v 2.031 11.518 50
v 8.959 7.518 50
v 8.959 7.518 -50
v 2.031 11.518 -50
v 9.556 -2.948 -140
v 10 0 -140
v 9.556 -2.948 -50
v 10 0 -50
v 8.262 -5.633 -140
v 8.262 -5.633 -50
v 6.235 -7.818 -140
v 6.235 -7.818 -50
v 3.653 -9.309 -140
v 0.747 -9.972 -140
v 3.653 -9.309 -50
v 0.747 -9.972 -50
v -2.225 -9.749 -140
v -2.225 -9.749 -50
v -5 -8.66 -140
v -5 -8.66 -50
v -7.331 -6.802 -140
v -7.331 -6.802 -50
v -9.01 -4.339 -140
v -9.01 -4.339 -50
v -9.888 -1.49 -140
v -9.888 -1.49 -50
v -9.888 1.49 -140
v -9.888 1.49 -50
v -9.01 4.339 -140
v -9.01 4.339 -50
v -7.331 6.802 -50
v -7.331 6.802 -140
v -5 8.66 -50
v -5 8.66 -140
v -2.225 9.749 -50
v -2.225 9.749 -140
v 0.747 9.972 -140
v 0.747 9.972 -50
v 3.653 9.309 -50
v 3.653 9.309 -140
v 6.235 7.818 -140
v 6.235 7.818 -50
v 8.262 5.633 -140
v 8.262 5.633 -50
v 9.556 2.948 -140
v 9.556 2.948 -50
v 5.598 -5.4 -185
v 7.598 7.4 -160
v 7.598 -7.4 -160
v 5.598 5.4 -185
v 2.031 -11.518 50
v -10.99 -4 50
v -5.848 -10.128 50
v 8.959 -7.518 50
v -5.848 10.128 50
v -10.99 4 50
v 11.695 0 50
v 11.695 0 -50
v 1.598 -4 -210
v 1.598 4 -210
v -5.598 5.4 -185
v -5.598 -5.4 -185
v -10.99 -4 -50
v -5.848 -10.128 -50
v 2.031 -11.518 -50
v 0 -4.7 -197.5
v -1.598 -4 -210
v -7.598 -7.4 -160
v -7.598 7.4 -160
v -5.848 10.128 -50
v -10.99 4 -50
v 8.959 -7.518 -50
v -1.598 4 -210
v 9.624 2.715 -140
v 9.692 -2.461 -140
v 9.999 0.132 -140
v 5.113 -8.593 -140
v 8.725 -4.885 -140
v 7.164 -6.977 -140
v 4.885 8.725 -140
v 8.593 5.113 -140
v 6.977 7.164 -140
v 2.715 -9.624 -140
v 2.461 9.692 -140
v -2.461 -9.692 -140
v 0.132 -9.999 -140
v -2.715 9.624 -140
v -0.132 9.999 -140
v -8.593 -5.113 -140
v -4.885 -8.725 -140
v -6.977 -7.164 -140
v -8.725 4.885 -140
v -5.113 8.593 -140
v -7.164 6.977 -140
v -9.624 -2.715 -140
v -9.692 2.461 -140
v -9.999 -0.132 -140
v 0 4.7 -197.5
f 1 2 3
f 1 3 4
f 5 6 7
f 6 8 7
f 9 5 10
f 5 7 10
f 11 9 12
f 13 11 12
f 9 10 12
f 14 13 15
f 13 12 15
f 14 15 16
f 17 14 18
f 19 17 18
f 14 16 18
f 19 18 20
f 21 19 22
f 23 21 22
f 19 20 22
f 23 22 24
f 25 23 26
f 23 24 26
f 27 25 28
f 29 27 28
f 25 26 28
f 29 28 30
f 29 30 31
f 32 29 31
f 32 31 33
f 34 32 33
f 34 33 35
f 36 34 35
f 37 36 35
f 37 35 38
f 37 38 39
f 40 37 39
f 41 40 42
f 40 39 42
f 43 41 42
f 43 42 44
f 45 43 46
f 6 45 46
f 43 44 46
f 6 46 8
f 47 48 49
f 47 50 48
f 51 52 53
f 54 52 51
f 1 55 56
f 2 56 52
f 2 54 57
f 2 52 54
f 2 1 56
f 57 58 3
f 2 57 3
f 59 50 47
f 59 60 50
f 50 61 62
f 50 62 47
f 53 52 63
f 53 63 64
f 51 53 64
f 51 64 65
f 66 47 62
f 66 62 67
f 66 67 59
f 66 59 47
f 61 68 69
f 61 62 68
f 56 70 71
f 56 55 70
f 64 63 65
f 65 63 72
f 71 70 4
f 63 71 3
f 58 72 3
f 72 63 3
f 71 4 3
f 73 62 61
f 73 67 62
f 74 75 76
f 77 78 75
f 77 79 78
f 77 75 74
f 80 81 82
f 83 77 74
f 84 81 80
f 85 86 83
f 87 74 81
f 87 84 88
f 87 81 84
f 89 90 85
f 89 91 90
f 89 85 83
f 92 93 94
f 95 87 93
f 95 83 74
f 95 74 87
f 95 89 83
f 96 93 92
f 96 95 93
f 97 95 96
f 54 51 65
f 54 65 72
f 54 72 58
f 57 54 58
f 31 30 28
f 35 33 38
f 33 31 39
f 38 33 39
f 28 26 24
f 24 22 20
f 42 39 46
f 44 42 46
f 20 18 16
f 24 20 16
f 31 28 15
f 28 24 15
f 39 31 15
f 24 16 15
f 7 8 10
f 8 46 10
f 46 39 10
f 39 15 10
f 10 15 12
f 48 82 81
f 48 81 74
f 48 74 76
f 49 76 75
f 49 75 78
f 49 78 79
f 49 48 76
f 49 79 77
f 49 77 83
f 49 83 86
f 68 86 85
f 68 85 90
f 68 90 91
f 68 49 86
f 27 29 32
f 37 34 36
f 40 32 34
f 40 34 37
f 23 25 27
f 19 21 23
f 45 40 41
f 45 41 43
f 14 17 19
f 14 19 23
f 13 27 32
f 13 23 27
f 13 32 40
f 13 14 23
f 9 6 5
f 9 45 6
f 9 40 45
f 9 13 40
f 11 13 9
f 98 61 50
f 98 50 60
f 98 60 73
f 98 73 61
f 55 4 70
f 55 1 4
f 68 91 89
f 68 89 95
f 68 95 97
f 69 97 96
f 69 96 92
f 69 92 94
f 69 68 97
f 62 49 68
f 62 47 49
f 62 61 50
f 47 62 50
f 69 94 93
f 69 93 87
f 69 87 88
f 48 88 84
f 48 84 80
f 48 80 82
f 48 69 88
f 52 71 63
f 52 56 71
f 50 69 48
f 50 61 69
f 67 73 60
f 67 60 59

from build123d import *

# Parameters (mm, degrees)
F1_DEPTH = 50
F3_R     = 10
F4_R     = 10
F7_W     = 15.1952523738
F7_H     = 14.7997830063
F10_W    = 11.1952523738
F10_H    = 10.7997830063
F13_W    = 3.1952523738
F13_H    = 8


# Not quite as in the source:
# - the arcs of a loft's sections are written as splines that run evenly, so that the points pair up as in the source's solid


with BuildPart() as f1:
    # F0 (on Top) → F1 (new body, symmetric)
    with BuildSketch(Plane.XY):
        Polygon((-10.9899096778, 4), (-10.9899096778, -4), (-5.8476088003, -10.128355545), (2.0308532238, -11.5175409663), (8.959056454, -7.5175409663), (11.6952176007, 0), (8.959056454, 7.5175409663), (2.0308532238, 11.5175409663), (-5.8476088003, 10.128355545), align=None)
    extrude(amount=F1_DEPTH, both=True)


with BuildPart() as f5:
    # F3 (on offset) → F5 section 0
    with BuildSketch(Plane(origin=(0, 0, -140), x_dir=(1, 0, 0), z_dir=(0, 0, -1))):
        Circle(F3_R)
    # F4 (on face) → F5 section 1
    with BuildSketch(Plane(origin=(0, 0, -50), x_dir=(1, 0, 0), z_dir=(0, 0, -1))):
        Circle(F4_R)
    loft()


with BuildPart() as f8:
    # F3 (on offset) → F8 section 0
    with BuildSketch(Plane(origin=(0, 0, -140), x_dir=(1, 0, 0), z_dir=(0, 0, -1))):
        with BuildLine():
            add(Edge.make_bspline(
                [(7.163673657, 6.977232957), (6.2503559987, 7.9149556459), (5.1509464413, 8.6707106828), (2.7456535845, 9.704373209), (1.4407166651, 9.9818739963), (-1.1770496985, 10.0163879215), (-2.4888491633, 9.7733874797), (-4.9205578349, 8.8034983717), (-6.0395102681, 8.0769913154), (-6.977232957, 7.163673657)],
                knots=[0, 0, 0, 0, 0.25, 0.25, 0.5, 0.5, 0.75, 0.75, 1, 1, 1, 1], degree=3))
            add(Edge.make_bspline(
                [(-6.977232957, 7.163673657), (-7.9149556459, 6.2503559987), (-8.6707106828, 5.1509464413), (-9.704373209, 2.7456535845), (-9.9818739963, 1.4407166651), (-10.0163879215, -1.1770496985), (-9.7733874797, -2.4888491633), (-8.8034983717, -4.9205578349), (-8.0769913154, -6.0395102681), (-7.163673657, -6.977232957)],
                knots=[0, 0, 0, 0, 0.25, 0.25, 0.5, 0.5, 0.75, 0.75, 1, 1, 1, 1], degree=3))
            add(Edge.make_bspline(
                [(-7.163673657, -6.977232957), (-6.2503559987, -7.9149556459), (-5.1509464413, -8.6707106828), (-2.7456535845, -9.704373209), (-1.4407166651, -9.9818739963), (1.1770496985, -10.0163879215), (2.4888491633, -9.7733874797), (4.9205578349, -8.8034983717), (6.0395102681, -8.0769913154), (6.977232957, -7.163673657)],
                knots=[0, 0, 0, 0, 0.25, 0.25, 0.5, 0.5, 0.75, 0.75, 1, 1, 1, 1], degree=3))
            add(Edge.make_bspline(
                [(6.977232957, -7.163673657), (7.9149556459, -6.2503559987), (8.6707106828, -5.1509464413), (9.704373209, -2.7456535845), (9.9818739963, -1.4407166651), (10.0163879215, 1.1770496985), (9.7733874797, 2.4888491633), (8.8034983717, 4.9205578349), (8.0769913154, 6.0395102681), (7.163673657, 6.977232957)],
                knots=[0, 0, 0, 0, 0.25, 0.25, 0.5, 0.5, 0.75, 0.75, 1, 1, 1, 1], degree=3))
        make_face()
    # F7 (on offset) → F8 section 1
    with BuildSketch(Plane(origin=(0, 0, -160), x_dir=(1, 0, 0), z_dir=(0, 0, -1))):
        Rectangle(F7_W, F7_H)
    loft(ruled=True)

    # F7 (on offset) → F11 section 0
    with BuildSketch(Plane(origin=(0, 0, -160), x_dir=(1, 0, 0), z_dir=(0, 0, -1))):
        Rectangle(F7_W, F7_H)
    # F10 (on offset) → F11 section 1
    with BuildSketch(Plane(origin=(0, 0, -185), x_dir=(1, 0, 0), z_dir=(0, 0, -1))):
        Rectangle(F10_W, F10_H)
    loft()


with BuildPart() as f14:
    # F10 (on offset) → F14 section 0
    with BuildSketch(Plane(origin=(0, 0, -185), x_dir=(1, 0, 0), z_dir=(0, 0, -1))):
        Rectangle(F10_W, F10_H)
    # F13 (on offset) → F14 section 1
    with BuildSketch(Plane(origin=(0, 0, -210), x_dir=(1, 0, 0), z_dir=(0, 0, -1))):
        Rectangle(F13_W, F13_H)
    loft()


solid = Compound([f1.part, f5.part, f8.part, f14.part])
